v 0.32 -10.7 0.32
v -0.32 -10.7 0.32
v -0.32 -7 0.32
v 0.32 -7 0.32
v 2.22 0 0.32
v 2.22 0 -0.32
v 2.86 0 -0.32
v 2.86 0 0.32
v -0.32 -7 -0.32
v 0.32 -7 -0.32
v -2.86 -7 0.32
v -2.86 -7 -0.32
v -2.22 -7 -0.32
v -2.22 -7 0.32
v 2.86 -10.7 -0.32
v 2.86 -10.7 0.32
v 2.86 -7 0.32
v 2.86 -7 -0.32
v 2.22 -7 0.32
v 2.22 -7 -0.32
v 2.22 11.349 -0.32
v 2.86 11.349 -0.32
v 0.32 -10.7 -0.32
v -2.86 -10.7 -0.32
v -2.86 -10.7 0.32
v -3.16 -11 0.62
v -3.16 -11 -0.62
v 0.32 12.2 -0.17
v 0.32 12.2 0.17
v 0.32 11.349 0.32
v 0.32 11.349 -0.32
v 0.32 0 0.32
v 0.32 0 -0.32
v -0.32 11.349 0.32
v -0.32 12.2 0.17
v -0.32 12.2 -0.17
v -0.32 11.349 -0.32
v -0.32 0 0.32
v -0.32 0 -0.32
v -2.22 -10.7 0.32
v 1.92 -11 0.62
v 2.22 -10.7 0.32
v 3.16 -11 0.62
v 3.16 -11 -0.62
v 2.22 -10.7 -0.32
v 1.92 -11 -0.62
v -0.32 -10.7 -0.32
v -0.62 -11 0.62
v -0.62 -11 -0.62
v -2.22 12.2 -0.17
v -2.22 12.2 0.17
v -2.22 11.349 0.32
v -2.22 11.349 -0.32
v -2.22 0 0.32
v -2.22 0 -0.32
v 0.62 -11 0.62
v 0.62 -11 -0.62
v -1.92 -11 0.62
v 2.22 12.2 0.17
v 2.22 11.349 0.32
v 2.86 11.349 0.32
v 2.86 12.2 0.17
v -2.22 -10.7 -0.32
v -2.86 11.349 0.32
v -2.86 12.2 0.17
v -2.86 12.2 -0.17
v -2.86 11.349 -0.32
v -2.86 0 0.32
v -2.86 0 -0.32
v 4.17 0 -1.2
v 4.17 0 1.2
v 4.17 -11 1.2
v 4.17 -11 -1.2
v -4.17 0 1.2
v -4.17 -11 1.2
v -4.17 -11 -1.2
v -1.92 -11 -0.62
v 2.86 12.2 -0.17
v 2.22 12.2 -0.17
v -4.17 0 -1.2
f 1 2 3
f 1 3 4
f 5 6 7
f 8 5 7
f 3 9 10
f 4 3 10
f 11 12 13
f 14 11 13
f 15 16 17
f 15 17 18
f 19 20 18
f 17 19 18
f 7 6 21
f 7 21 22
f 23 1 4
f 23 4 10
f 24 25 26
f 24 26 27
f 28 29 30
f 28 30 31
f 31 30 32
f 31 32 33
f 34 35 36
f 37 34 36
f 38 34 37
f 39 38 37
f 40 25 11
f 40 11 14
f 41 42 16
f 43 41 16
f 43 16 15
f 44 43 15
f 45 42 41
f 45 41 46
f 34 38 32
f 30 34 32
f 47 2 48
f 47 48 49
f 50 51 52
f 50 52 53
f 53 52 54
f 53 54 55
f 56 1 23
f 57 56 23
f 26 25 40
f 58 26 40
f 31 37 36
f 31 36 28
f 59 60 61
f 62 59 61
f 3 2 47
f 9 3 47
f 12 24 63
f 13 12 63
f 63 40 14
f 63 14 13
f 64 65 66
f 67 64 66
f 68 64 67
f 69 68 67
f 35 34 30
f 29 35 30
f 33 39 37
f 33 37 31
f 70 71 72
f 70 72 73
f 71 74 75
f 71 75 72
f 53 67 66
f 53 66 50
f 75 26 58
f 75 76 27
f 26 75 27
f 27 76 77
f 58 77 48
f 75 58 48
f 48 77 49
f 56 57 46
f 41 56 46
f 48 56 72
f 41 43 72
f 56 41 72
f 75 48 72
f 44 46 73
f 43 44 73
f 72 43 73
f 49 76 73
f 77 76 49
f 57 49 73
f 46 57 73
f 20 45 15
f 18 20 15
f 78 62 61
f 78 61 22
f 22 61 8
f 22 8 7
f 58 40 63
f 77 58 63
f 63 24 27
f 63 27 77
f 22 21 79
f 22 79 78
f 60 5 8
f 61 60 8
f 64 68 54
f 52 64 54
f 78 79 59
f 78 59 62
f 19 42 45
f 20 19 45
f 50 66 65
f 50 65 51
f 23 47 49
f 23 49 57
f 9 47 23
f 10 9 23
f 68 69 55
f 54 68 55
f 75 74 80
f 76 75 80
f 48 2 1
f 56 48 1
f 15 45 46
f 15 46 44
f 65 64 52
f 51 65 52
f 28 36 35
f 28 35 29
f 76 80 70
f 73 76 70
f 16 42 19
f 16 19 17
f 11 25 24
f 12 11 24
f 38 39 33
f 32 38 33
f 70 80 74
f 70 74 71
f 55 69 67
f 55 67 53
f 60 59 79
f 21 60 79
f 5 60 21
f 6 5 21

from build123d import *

# Parameters (mm, degrees)
SKETCH1_W             = 8.34
SKETCH1_H             = 2.4
BOSS_EXTRUDE1_DEPTH   = 11
SKETCH2_W             = 0.64
SKETCH2_H             = 0.64
BOSS_EXTRUDE2_DEPTH   = 12.2
BOSS_EXTRUDE2_2_DEPTH = 12.2
BOSS_EXTRUDE2_3_DEPTH = 12.2
CHAMFER1_SIZE         = 0.15
CHAMFER1_SIZE2        = 0.850692273
CHAMFER2_SIZE         = 0.15
CHAMFER2_SIZE2        = 0.850692273
CHAMFER3_SIZE         = 0.15
CHAMFER3_SIZE2        = 0.850692273
CUT_EXTRUDE1_START    = -11
SKETCH2_2_W           = 0.64
SKETCH2_2_H           = 0.64
CUT_EXTRUDE1_DEPTH    = 4
CHAMFER4_SIZE         = 0.3


with BuildPart() as part:
    # Sketch1 → Boss-Extrude1 (new body)
    with BuildSketch(Plane(origin=(0, 0, 0), x_dir=(1, 0, 0), z_dir=(0, 1, 0))):
        Rectangle(SKETCH1_W, SKETCH1_H)
    extrude(amount=-BOSS_EXTRUDE1_DEPTH)

    # Sketch2<2> → Cut-Extrude1 (cut)
    with BuildSketch(Plane(origin=(0, 0, 0), x_dir=(1, 0, 0), z_dir=(0, 1, 0)).offset(CUT_EXTRUDE1_START)):
        Rectangle(SKETCH2_2_W, SKETCH2_2_H)
        with Locations((-2.54, 0)):
            Rectangle(SKETCH2_2_W, SKETCH2_2_H)
        with Locations((2.54, 0)):
            Rectangle(SKETCH2_2_W, SKETCH2_2_H)
    extrude(amount=CUT_EXTRUDE1_DEPTH, mode=Mode.SUBTRACT)

    # Chamfer4
    chamfer4_edges = [part.edges().sort_by_distance(p)[0] for p in [
        (-0.32, -11, 0),
        (0, -11, 0.32),
        (0.32, -11, 0),
        (0, -11, -0.32),
        (-2.86, -11, 0),
        (-2.54, -11, 0.32),
        (-2.22, -11, 0),
        (-2.54, -11, -0.32),
        (2.54, -11, -0.32),
        (2.22, -11, 0),
        (2.54, -11, 0.32),
        (2.86, -11, 0),
    ]]
    chamfer(chamfer4_edges, length=CHAMFER4_SIZE)


with BuildPart() as body_2:
    # Sketch2 → Boss-Extrude2 (new body)
    with BuildSketch(Plane(origin=(0, 0, 0), x_dir=(1, 0, 0), z_dir=(0, 1, 0))):
        Rectangle(SKETCH2_W, SKETCH2_H)
    extrude(amount=BOSS_EXTRUDE2_DEPTH)

    # Chamfer2
    chamfer2_edges = [body_2.edges().sort_by_distance(p)[0] for p in [
        (0, 12.2, -0.32),
        (0, 12.2, 0.32),
    ]]
    chamfer2_side = [body_2.faces().sort_by_distance(p)[0] for p in [
        (0, 12.2, 0),
    ]]
    chamfer(chamfer2_edges, length=CHAMFER2_SIZE, length2=CHAMFER2_SIZE2, reference=chamfer2_side[0])


with BuildPart() as body_3:
    # Sketch2 → Boss-Extrude2 2 (new body)
    with BuildSketch(Plane(origin=(0, 0, 0), x_dir=(1, 0, 0), z_dir=(0, 1, 0))):
        with Locations((-2.54, 0)):
            Rectangle(SKETCH2_W, SKETCH2_H)
    extrude(amount=BOSS_EXTRUDE2_2_DEPTH)

    # Chamfer1
    chamfer1_edges = [body_3.edges().sort_by_distance(p)[0] for p in [
        (-2.54, 12.2, -0.32),
        (-2.54, 12.2, 0.32),
    ]]
    chamfer1_side = [body_3.faces().sort_by_distance(p)[0] for p in [
        (-2.54, 12.2, 0),
    ]]
    chamfer(chamfer1_edges, length=CHAMFER1_SIZE, length2=CHAMFER1_SIZE2, reference=chamfer1_side[0])


with BuildPart() as body_4:
    # Sketch2 → Boss-Extrude2 3 (new body)
    with BuildSketch(Plane(origin=(0, 0, 0), x_dir=(1, 0, 0), z_dir=(0, 1, 0))):
        with Locations((2.54, 0)):
            Rectangle(SKETCH2_W, SKETCH2_H)
    extrude(amount=BOSS_EXTRUDE2_3_DEPTH)

    # Chamfer3
    chamfer3_edges = [body_4.edges().sort_by_distance(p)[0] for p in [
        (2.54, 12.2, 0.32),
        (2.54, 12.2, -0.32),
    ]]
    chamfer3_side = [body_4.faces().sort_by_distance(p)[0] for p in [
        (2.54, 12.2, 0),
    ]]
    chamfer(chamfer3_edges, length=CHAMFER3_SIZE, length2=CHAMFER3_SIZE2, reference=chamfer3_side[0])


solid = Compound([part.part, body_2.part, body_3.part, body_4.part])
